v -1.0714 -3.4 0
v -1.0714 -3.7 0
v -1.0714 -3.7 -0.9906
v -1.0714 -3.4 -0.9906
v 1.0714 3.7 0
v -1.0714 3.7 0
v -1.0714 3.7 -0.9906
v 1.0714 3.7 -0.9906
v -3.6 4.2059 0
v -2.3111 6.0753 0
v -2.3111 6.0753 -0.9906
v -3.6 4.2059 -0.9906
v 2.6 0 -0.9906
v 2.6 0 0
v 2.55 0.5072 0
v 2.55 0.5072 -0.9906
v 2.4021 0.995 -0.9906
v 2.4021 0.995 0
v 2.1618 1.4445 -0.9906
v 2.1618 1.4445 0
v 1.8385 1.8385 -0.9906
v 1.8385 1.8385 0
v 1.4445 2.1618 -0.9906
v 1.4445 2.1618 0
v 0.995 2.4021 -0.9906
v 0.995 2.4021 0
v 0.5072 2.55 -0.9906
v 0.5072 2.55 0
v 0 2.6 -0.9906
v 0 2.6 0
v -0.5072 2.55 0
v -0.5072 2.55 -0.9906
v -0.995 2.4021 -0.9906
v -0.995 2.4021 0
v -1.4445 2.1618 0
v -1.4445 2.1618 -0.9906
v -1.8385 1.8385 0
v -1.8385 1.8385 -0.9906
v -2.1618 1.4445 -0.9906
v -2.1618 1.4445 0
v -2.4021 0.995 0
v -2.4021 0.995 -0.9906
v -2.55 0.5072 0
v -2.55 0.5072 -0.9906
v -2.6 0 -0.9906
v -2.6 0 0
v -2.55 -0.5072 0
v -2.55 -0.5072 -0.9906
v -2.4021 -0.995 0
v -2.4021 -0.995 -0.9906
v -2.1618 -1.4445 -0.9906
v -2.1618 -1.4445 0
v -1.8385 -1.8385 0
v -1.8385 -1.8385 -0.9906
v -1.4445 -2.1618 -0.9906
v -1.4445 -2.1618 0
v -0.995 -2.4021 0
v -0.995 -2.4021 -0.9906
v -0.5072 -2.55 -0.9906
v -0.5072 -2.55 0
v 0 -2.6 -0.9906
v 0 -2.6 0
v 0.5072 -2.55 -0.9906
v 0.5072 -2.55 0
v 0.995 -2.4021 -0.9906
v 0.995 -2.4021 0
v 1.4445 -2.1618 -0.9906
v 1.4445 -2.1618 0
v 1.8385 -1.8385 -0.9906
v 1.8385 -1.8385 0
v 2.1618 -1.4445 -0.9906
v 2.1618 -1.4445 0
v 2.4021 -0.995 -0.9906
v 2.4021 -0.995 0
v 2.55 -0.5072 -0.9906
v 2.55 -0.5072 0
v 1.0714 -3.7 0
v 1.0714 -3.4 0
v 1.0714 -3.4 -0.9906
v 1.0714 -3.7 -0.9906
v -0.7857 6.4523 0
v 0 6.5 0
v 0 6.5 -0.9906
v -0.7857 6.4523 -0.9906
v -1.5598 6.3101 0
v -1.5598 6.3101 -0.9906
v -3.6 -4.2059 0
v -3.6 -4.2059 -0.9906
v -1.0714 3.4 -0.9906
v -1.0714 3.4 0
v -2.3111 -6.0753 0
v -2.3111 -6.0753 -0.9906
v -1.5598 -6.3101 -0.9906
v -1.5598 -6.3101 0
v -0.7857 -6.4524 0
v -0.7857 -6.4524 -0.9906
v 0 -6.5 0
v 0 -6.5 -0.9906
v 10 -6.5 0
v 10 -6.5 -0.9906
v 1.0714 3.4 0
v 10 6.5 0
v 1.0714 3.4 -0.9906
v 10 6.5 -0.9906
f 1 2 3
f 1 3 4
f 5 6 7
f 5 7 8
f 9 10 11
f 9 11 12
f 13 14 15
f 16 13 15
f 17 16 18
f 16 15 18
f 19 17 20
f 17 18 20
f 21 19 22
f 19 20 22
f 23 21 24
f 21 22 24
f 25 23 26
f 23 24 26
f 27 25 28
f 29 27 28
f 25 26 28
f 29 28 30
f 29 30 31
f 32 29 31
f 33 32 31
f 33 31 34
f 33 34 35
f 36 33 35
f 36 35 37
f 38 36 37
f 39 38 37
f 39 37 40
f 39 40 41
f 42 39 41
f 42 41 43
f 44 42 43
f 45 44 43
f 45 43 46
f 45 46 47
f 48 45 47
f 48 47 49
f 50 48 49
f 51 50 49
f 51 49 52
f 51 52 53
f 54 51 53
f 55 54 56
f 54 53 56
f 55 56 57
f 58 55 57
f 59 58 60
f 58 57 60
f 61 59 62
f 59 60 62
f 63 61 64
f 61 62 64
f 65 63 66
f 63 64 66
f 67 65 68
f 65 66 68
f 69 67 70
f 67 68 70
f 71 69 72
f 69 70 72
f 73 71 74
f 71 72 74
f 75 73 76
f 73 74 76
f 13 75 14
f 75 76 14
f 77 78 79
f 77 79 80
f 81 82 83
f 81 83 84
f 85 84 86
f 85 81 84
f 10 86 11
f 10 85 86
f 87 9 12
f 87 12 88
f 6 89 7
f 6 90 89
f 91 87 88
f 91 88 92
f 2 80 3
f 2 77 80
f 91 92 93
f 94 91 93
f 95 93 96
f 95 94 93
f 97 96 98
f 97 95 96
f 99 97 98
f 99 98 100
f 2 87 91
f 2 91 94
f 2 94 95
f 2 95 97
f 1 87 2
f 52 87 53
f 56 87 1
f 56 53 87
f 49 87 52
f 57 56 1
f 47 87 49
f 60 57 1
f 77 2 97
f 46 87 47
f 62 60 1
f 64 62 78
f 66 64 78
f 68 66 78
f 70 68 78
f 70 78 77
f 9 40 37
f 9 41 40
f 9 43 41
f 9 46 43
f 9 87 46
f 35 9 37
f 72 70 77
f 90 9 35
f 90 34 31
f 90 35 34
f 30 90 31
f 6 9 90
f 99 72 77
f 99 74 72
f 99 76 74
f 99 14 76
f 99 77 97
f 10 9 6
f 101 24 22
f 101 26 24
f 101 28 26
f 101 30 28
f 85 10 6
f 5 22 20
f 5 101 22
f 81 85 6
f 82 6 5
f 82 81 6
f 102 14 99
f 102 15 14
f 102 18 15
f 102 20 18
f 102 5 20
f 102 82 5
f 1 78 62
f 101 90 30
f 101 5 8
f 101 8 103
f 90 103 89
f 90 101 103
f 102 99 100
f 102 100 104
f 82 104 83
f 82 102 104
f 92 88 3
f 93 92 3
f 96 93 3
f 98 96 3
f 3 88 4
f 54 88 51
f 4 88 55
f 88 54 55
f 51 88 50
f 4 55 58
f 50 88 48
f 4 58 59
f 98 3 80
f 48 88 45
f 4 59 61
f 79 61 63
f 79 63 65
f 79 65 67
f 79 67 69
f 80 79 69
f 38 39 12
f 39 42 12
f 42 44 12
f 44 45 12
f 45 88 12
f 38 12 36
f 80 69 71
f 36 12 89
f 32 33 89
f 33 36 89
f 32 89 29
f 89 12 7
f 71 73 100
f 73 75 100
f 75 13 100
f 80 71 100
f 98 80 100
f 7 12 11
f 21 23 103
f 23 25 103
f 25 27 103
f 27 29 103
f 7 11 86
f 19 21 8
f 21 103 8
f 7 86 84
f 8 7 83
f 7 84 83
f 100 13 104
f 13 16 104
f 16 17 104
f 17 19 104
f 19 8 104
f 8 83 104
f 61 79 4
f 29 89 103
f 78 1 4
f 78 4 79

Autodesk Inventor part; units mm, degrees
ref_plane "YZ Plane" through (0, 0, 0) normal (1, 0, 0) x (0, 1, 0)
ref_plane "XZ Plane" through (0, 0, 0) normal (0, 1, 0) x (-1, 0, 0)
ref_plane "XY Plane" through (0, 0, 0) normal (0, 0, 1) x (1, 0, 0)
sketch "Sketch1" plane through (0, 0, 0) normal (0, 0, 1) x (1, 0, 0)
  line L0 (-3.6, 4.2059) -> (-3.6, -4.2059)
  line L1 (-3.6, -4.2059) -> (-2.3111, -6.0753)
  arc A0 (-2.3111, -6.0753) -> (0, -6.5) centre (0, 0) ccw
  line L2 (0, -6.5) -> (10, -6.5)
  line L3 (10, -6.5) -> (10, 6.5)
  line L4 (10, 6.5) -> (0, 6.5)
  arc A1 (0, 6.5) -> (-2.3111, 6.0753) centre (0, 0) ccw
  line L5 (-2.3111, 6.0753) -> (-3.6, 4.2059)
  circle A2 centre (0, 0) radius 2.6
extrude "Extrusion1" add sketch "Sketch1" against normal blind 0.9906
sketch "Sketch2" plane through (0, 0, 0) normal (0, 0, 1) x (1, 0, 0)
  line L0 (-1.0714, 3.7) -> (1.0714, 3.7) projected
  line L1 (-1.0714, 3.4) -> (-1.0714, 3.7) projected
  line L2 (1.0714, 3.4) -> (-1.0714, 3.4) projected
  line L3 (1.0714, 3.7) -> (1.0714, 3.4) projected
  line L4 (-1.0714, -3.4) -> (1.0714, -3.4) projected
  line L5 (-1.0714, -3.7) -> (-1.0714, -3.4) projected
  line L6 (1.0714, -3.7) -> (-1.0714, -3.7) projected
  line L7 (1.0714, -3.4) -> (1.0714, -3.7) projected
extrude "Extrusion2" cut sketch "Sketch2" against normal up to next
properties part number "276-2181-012 Rev1" material "Steel"
